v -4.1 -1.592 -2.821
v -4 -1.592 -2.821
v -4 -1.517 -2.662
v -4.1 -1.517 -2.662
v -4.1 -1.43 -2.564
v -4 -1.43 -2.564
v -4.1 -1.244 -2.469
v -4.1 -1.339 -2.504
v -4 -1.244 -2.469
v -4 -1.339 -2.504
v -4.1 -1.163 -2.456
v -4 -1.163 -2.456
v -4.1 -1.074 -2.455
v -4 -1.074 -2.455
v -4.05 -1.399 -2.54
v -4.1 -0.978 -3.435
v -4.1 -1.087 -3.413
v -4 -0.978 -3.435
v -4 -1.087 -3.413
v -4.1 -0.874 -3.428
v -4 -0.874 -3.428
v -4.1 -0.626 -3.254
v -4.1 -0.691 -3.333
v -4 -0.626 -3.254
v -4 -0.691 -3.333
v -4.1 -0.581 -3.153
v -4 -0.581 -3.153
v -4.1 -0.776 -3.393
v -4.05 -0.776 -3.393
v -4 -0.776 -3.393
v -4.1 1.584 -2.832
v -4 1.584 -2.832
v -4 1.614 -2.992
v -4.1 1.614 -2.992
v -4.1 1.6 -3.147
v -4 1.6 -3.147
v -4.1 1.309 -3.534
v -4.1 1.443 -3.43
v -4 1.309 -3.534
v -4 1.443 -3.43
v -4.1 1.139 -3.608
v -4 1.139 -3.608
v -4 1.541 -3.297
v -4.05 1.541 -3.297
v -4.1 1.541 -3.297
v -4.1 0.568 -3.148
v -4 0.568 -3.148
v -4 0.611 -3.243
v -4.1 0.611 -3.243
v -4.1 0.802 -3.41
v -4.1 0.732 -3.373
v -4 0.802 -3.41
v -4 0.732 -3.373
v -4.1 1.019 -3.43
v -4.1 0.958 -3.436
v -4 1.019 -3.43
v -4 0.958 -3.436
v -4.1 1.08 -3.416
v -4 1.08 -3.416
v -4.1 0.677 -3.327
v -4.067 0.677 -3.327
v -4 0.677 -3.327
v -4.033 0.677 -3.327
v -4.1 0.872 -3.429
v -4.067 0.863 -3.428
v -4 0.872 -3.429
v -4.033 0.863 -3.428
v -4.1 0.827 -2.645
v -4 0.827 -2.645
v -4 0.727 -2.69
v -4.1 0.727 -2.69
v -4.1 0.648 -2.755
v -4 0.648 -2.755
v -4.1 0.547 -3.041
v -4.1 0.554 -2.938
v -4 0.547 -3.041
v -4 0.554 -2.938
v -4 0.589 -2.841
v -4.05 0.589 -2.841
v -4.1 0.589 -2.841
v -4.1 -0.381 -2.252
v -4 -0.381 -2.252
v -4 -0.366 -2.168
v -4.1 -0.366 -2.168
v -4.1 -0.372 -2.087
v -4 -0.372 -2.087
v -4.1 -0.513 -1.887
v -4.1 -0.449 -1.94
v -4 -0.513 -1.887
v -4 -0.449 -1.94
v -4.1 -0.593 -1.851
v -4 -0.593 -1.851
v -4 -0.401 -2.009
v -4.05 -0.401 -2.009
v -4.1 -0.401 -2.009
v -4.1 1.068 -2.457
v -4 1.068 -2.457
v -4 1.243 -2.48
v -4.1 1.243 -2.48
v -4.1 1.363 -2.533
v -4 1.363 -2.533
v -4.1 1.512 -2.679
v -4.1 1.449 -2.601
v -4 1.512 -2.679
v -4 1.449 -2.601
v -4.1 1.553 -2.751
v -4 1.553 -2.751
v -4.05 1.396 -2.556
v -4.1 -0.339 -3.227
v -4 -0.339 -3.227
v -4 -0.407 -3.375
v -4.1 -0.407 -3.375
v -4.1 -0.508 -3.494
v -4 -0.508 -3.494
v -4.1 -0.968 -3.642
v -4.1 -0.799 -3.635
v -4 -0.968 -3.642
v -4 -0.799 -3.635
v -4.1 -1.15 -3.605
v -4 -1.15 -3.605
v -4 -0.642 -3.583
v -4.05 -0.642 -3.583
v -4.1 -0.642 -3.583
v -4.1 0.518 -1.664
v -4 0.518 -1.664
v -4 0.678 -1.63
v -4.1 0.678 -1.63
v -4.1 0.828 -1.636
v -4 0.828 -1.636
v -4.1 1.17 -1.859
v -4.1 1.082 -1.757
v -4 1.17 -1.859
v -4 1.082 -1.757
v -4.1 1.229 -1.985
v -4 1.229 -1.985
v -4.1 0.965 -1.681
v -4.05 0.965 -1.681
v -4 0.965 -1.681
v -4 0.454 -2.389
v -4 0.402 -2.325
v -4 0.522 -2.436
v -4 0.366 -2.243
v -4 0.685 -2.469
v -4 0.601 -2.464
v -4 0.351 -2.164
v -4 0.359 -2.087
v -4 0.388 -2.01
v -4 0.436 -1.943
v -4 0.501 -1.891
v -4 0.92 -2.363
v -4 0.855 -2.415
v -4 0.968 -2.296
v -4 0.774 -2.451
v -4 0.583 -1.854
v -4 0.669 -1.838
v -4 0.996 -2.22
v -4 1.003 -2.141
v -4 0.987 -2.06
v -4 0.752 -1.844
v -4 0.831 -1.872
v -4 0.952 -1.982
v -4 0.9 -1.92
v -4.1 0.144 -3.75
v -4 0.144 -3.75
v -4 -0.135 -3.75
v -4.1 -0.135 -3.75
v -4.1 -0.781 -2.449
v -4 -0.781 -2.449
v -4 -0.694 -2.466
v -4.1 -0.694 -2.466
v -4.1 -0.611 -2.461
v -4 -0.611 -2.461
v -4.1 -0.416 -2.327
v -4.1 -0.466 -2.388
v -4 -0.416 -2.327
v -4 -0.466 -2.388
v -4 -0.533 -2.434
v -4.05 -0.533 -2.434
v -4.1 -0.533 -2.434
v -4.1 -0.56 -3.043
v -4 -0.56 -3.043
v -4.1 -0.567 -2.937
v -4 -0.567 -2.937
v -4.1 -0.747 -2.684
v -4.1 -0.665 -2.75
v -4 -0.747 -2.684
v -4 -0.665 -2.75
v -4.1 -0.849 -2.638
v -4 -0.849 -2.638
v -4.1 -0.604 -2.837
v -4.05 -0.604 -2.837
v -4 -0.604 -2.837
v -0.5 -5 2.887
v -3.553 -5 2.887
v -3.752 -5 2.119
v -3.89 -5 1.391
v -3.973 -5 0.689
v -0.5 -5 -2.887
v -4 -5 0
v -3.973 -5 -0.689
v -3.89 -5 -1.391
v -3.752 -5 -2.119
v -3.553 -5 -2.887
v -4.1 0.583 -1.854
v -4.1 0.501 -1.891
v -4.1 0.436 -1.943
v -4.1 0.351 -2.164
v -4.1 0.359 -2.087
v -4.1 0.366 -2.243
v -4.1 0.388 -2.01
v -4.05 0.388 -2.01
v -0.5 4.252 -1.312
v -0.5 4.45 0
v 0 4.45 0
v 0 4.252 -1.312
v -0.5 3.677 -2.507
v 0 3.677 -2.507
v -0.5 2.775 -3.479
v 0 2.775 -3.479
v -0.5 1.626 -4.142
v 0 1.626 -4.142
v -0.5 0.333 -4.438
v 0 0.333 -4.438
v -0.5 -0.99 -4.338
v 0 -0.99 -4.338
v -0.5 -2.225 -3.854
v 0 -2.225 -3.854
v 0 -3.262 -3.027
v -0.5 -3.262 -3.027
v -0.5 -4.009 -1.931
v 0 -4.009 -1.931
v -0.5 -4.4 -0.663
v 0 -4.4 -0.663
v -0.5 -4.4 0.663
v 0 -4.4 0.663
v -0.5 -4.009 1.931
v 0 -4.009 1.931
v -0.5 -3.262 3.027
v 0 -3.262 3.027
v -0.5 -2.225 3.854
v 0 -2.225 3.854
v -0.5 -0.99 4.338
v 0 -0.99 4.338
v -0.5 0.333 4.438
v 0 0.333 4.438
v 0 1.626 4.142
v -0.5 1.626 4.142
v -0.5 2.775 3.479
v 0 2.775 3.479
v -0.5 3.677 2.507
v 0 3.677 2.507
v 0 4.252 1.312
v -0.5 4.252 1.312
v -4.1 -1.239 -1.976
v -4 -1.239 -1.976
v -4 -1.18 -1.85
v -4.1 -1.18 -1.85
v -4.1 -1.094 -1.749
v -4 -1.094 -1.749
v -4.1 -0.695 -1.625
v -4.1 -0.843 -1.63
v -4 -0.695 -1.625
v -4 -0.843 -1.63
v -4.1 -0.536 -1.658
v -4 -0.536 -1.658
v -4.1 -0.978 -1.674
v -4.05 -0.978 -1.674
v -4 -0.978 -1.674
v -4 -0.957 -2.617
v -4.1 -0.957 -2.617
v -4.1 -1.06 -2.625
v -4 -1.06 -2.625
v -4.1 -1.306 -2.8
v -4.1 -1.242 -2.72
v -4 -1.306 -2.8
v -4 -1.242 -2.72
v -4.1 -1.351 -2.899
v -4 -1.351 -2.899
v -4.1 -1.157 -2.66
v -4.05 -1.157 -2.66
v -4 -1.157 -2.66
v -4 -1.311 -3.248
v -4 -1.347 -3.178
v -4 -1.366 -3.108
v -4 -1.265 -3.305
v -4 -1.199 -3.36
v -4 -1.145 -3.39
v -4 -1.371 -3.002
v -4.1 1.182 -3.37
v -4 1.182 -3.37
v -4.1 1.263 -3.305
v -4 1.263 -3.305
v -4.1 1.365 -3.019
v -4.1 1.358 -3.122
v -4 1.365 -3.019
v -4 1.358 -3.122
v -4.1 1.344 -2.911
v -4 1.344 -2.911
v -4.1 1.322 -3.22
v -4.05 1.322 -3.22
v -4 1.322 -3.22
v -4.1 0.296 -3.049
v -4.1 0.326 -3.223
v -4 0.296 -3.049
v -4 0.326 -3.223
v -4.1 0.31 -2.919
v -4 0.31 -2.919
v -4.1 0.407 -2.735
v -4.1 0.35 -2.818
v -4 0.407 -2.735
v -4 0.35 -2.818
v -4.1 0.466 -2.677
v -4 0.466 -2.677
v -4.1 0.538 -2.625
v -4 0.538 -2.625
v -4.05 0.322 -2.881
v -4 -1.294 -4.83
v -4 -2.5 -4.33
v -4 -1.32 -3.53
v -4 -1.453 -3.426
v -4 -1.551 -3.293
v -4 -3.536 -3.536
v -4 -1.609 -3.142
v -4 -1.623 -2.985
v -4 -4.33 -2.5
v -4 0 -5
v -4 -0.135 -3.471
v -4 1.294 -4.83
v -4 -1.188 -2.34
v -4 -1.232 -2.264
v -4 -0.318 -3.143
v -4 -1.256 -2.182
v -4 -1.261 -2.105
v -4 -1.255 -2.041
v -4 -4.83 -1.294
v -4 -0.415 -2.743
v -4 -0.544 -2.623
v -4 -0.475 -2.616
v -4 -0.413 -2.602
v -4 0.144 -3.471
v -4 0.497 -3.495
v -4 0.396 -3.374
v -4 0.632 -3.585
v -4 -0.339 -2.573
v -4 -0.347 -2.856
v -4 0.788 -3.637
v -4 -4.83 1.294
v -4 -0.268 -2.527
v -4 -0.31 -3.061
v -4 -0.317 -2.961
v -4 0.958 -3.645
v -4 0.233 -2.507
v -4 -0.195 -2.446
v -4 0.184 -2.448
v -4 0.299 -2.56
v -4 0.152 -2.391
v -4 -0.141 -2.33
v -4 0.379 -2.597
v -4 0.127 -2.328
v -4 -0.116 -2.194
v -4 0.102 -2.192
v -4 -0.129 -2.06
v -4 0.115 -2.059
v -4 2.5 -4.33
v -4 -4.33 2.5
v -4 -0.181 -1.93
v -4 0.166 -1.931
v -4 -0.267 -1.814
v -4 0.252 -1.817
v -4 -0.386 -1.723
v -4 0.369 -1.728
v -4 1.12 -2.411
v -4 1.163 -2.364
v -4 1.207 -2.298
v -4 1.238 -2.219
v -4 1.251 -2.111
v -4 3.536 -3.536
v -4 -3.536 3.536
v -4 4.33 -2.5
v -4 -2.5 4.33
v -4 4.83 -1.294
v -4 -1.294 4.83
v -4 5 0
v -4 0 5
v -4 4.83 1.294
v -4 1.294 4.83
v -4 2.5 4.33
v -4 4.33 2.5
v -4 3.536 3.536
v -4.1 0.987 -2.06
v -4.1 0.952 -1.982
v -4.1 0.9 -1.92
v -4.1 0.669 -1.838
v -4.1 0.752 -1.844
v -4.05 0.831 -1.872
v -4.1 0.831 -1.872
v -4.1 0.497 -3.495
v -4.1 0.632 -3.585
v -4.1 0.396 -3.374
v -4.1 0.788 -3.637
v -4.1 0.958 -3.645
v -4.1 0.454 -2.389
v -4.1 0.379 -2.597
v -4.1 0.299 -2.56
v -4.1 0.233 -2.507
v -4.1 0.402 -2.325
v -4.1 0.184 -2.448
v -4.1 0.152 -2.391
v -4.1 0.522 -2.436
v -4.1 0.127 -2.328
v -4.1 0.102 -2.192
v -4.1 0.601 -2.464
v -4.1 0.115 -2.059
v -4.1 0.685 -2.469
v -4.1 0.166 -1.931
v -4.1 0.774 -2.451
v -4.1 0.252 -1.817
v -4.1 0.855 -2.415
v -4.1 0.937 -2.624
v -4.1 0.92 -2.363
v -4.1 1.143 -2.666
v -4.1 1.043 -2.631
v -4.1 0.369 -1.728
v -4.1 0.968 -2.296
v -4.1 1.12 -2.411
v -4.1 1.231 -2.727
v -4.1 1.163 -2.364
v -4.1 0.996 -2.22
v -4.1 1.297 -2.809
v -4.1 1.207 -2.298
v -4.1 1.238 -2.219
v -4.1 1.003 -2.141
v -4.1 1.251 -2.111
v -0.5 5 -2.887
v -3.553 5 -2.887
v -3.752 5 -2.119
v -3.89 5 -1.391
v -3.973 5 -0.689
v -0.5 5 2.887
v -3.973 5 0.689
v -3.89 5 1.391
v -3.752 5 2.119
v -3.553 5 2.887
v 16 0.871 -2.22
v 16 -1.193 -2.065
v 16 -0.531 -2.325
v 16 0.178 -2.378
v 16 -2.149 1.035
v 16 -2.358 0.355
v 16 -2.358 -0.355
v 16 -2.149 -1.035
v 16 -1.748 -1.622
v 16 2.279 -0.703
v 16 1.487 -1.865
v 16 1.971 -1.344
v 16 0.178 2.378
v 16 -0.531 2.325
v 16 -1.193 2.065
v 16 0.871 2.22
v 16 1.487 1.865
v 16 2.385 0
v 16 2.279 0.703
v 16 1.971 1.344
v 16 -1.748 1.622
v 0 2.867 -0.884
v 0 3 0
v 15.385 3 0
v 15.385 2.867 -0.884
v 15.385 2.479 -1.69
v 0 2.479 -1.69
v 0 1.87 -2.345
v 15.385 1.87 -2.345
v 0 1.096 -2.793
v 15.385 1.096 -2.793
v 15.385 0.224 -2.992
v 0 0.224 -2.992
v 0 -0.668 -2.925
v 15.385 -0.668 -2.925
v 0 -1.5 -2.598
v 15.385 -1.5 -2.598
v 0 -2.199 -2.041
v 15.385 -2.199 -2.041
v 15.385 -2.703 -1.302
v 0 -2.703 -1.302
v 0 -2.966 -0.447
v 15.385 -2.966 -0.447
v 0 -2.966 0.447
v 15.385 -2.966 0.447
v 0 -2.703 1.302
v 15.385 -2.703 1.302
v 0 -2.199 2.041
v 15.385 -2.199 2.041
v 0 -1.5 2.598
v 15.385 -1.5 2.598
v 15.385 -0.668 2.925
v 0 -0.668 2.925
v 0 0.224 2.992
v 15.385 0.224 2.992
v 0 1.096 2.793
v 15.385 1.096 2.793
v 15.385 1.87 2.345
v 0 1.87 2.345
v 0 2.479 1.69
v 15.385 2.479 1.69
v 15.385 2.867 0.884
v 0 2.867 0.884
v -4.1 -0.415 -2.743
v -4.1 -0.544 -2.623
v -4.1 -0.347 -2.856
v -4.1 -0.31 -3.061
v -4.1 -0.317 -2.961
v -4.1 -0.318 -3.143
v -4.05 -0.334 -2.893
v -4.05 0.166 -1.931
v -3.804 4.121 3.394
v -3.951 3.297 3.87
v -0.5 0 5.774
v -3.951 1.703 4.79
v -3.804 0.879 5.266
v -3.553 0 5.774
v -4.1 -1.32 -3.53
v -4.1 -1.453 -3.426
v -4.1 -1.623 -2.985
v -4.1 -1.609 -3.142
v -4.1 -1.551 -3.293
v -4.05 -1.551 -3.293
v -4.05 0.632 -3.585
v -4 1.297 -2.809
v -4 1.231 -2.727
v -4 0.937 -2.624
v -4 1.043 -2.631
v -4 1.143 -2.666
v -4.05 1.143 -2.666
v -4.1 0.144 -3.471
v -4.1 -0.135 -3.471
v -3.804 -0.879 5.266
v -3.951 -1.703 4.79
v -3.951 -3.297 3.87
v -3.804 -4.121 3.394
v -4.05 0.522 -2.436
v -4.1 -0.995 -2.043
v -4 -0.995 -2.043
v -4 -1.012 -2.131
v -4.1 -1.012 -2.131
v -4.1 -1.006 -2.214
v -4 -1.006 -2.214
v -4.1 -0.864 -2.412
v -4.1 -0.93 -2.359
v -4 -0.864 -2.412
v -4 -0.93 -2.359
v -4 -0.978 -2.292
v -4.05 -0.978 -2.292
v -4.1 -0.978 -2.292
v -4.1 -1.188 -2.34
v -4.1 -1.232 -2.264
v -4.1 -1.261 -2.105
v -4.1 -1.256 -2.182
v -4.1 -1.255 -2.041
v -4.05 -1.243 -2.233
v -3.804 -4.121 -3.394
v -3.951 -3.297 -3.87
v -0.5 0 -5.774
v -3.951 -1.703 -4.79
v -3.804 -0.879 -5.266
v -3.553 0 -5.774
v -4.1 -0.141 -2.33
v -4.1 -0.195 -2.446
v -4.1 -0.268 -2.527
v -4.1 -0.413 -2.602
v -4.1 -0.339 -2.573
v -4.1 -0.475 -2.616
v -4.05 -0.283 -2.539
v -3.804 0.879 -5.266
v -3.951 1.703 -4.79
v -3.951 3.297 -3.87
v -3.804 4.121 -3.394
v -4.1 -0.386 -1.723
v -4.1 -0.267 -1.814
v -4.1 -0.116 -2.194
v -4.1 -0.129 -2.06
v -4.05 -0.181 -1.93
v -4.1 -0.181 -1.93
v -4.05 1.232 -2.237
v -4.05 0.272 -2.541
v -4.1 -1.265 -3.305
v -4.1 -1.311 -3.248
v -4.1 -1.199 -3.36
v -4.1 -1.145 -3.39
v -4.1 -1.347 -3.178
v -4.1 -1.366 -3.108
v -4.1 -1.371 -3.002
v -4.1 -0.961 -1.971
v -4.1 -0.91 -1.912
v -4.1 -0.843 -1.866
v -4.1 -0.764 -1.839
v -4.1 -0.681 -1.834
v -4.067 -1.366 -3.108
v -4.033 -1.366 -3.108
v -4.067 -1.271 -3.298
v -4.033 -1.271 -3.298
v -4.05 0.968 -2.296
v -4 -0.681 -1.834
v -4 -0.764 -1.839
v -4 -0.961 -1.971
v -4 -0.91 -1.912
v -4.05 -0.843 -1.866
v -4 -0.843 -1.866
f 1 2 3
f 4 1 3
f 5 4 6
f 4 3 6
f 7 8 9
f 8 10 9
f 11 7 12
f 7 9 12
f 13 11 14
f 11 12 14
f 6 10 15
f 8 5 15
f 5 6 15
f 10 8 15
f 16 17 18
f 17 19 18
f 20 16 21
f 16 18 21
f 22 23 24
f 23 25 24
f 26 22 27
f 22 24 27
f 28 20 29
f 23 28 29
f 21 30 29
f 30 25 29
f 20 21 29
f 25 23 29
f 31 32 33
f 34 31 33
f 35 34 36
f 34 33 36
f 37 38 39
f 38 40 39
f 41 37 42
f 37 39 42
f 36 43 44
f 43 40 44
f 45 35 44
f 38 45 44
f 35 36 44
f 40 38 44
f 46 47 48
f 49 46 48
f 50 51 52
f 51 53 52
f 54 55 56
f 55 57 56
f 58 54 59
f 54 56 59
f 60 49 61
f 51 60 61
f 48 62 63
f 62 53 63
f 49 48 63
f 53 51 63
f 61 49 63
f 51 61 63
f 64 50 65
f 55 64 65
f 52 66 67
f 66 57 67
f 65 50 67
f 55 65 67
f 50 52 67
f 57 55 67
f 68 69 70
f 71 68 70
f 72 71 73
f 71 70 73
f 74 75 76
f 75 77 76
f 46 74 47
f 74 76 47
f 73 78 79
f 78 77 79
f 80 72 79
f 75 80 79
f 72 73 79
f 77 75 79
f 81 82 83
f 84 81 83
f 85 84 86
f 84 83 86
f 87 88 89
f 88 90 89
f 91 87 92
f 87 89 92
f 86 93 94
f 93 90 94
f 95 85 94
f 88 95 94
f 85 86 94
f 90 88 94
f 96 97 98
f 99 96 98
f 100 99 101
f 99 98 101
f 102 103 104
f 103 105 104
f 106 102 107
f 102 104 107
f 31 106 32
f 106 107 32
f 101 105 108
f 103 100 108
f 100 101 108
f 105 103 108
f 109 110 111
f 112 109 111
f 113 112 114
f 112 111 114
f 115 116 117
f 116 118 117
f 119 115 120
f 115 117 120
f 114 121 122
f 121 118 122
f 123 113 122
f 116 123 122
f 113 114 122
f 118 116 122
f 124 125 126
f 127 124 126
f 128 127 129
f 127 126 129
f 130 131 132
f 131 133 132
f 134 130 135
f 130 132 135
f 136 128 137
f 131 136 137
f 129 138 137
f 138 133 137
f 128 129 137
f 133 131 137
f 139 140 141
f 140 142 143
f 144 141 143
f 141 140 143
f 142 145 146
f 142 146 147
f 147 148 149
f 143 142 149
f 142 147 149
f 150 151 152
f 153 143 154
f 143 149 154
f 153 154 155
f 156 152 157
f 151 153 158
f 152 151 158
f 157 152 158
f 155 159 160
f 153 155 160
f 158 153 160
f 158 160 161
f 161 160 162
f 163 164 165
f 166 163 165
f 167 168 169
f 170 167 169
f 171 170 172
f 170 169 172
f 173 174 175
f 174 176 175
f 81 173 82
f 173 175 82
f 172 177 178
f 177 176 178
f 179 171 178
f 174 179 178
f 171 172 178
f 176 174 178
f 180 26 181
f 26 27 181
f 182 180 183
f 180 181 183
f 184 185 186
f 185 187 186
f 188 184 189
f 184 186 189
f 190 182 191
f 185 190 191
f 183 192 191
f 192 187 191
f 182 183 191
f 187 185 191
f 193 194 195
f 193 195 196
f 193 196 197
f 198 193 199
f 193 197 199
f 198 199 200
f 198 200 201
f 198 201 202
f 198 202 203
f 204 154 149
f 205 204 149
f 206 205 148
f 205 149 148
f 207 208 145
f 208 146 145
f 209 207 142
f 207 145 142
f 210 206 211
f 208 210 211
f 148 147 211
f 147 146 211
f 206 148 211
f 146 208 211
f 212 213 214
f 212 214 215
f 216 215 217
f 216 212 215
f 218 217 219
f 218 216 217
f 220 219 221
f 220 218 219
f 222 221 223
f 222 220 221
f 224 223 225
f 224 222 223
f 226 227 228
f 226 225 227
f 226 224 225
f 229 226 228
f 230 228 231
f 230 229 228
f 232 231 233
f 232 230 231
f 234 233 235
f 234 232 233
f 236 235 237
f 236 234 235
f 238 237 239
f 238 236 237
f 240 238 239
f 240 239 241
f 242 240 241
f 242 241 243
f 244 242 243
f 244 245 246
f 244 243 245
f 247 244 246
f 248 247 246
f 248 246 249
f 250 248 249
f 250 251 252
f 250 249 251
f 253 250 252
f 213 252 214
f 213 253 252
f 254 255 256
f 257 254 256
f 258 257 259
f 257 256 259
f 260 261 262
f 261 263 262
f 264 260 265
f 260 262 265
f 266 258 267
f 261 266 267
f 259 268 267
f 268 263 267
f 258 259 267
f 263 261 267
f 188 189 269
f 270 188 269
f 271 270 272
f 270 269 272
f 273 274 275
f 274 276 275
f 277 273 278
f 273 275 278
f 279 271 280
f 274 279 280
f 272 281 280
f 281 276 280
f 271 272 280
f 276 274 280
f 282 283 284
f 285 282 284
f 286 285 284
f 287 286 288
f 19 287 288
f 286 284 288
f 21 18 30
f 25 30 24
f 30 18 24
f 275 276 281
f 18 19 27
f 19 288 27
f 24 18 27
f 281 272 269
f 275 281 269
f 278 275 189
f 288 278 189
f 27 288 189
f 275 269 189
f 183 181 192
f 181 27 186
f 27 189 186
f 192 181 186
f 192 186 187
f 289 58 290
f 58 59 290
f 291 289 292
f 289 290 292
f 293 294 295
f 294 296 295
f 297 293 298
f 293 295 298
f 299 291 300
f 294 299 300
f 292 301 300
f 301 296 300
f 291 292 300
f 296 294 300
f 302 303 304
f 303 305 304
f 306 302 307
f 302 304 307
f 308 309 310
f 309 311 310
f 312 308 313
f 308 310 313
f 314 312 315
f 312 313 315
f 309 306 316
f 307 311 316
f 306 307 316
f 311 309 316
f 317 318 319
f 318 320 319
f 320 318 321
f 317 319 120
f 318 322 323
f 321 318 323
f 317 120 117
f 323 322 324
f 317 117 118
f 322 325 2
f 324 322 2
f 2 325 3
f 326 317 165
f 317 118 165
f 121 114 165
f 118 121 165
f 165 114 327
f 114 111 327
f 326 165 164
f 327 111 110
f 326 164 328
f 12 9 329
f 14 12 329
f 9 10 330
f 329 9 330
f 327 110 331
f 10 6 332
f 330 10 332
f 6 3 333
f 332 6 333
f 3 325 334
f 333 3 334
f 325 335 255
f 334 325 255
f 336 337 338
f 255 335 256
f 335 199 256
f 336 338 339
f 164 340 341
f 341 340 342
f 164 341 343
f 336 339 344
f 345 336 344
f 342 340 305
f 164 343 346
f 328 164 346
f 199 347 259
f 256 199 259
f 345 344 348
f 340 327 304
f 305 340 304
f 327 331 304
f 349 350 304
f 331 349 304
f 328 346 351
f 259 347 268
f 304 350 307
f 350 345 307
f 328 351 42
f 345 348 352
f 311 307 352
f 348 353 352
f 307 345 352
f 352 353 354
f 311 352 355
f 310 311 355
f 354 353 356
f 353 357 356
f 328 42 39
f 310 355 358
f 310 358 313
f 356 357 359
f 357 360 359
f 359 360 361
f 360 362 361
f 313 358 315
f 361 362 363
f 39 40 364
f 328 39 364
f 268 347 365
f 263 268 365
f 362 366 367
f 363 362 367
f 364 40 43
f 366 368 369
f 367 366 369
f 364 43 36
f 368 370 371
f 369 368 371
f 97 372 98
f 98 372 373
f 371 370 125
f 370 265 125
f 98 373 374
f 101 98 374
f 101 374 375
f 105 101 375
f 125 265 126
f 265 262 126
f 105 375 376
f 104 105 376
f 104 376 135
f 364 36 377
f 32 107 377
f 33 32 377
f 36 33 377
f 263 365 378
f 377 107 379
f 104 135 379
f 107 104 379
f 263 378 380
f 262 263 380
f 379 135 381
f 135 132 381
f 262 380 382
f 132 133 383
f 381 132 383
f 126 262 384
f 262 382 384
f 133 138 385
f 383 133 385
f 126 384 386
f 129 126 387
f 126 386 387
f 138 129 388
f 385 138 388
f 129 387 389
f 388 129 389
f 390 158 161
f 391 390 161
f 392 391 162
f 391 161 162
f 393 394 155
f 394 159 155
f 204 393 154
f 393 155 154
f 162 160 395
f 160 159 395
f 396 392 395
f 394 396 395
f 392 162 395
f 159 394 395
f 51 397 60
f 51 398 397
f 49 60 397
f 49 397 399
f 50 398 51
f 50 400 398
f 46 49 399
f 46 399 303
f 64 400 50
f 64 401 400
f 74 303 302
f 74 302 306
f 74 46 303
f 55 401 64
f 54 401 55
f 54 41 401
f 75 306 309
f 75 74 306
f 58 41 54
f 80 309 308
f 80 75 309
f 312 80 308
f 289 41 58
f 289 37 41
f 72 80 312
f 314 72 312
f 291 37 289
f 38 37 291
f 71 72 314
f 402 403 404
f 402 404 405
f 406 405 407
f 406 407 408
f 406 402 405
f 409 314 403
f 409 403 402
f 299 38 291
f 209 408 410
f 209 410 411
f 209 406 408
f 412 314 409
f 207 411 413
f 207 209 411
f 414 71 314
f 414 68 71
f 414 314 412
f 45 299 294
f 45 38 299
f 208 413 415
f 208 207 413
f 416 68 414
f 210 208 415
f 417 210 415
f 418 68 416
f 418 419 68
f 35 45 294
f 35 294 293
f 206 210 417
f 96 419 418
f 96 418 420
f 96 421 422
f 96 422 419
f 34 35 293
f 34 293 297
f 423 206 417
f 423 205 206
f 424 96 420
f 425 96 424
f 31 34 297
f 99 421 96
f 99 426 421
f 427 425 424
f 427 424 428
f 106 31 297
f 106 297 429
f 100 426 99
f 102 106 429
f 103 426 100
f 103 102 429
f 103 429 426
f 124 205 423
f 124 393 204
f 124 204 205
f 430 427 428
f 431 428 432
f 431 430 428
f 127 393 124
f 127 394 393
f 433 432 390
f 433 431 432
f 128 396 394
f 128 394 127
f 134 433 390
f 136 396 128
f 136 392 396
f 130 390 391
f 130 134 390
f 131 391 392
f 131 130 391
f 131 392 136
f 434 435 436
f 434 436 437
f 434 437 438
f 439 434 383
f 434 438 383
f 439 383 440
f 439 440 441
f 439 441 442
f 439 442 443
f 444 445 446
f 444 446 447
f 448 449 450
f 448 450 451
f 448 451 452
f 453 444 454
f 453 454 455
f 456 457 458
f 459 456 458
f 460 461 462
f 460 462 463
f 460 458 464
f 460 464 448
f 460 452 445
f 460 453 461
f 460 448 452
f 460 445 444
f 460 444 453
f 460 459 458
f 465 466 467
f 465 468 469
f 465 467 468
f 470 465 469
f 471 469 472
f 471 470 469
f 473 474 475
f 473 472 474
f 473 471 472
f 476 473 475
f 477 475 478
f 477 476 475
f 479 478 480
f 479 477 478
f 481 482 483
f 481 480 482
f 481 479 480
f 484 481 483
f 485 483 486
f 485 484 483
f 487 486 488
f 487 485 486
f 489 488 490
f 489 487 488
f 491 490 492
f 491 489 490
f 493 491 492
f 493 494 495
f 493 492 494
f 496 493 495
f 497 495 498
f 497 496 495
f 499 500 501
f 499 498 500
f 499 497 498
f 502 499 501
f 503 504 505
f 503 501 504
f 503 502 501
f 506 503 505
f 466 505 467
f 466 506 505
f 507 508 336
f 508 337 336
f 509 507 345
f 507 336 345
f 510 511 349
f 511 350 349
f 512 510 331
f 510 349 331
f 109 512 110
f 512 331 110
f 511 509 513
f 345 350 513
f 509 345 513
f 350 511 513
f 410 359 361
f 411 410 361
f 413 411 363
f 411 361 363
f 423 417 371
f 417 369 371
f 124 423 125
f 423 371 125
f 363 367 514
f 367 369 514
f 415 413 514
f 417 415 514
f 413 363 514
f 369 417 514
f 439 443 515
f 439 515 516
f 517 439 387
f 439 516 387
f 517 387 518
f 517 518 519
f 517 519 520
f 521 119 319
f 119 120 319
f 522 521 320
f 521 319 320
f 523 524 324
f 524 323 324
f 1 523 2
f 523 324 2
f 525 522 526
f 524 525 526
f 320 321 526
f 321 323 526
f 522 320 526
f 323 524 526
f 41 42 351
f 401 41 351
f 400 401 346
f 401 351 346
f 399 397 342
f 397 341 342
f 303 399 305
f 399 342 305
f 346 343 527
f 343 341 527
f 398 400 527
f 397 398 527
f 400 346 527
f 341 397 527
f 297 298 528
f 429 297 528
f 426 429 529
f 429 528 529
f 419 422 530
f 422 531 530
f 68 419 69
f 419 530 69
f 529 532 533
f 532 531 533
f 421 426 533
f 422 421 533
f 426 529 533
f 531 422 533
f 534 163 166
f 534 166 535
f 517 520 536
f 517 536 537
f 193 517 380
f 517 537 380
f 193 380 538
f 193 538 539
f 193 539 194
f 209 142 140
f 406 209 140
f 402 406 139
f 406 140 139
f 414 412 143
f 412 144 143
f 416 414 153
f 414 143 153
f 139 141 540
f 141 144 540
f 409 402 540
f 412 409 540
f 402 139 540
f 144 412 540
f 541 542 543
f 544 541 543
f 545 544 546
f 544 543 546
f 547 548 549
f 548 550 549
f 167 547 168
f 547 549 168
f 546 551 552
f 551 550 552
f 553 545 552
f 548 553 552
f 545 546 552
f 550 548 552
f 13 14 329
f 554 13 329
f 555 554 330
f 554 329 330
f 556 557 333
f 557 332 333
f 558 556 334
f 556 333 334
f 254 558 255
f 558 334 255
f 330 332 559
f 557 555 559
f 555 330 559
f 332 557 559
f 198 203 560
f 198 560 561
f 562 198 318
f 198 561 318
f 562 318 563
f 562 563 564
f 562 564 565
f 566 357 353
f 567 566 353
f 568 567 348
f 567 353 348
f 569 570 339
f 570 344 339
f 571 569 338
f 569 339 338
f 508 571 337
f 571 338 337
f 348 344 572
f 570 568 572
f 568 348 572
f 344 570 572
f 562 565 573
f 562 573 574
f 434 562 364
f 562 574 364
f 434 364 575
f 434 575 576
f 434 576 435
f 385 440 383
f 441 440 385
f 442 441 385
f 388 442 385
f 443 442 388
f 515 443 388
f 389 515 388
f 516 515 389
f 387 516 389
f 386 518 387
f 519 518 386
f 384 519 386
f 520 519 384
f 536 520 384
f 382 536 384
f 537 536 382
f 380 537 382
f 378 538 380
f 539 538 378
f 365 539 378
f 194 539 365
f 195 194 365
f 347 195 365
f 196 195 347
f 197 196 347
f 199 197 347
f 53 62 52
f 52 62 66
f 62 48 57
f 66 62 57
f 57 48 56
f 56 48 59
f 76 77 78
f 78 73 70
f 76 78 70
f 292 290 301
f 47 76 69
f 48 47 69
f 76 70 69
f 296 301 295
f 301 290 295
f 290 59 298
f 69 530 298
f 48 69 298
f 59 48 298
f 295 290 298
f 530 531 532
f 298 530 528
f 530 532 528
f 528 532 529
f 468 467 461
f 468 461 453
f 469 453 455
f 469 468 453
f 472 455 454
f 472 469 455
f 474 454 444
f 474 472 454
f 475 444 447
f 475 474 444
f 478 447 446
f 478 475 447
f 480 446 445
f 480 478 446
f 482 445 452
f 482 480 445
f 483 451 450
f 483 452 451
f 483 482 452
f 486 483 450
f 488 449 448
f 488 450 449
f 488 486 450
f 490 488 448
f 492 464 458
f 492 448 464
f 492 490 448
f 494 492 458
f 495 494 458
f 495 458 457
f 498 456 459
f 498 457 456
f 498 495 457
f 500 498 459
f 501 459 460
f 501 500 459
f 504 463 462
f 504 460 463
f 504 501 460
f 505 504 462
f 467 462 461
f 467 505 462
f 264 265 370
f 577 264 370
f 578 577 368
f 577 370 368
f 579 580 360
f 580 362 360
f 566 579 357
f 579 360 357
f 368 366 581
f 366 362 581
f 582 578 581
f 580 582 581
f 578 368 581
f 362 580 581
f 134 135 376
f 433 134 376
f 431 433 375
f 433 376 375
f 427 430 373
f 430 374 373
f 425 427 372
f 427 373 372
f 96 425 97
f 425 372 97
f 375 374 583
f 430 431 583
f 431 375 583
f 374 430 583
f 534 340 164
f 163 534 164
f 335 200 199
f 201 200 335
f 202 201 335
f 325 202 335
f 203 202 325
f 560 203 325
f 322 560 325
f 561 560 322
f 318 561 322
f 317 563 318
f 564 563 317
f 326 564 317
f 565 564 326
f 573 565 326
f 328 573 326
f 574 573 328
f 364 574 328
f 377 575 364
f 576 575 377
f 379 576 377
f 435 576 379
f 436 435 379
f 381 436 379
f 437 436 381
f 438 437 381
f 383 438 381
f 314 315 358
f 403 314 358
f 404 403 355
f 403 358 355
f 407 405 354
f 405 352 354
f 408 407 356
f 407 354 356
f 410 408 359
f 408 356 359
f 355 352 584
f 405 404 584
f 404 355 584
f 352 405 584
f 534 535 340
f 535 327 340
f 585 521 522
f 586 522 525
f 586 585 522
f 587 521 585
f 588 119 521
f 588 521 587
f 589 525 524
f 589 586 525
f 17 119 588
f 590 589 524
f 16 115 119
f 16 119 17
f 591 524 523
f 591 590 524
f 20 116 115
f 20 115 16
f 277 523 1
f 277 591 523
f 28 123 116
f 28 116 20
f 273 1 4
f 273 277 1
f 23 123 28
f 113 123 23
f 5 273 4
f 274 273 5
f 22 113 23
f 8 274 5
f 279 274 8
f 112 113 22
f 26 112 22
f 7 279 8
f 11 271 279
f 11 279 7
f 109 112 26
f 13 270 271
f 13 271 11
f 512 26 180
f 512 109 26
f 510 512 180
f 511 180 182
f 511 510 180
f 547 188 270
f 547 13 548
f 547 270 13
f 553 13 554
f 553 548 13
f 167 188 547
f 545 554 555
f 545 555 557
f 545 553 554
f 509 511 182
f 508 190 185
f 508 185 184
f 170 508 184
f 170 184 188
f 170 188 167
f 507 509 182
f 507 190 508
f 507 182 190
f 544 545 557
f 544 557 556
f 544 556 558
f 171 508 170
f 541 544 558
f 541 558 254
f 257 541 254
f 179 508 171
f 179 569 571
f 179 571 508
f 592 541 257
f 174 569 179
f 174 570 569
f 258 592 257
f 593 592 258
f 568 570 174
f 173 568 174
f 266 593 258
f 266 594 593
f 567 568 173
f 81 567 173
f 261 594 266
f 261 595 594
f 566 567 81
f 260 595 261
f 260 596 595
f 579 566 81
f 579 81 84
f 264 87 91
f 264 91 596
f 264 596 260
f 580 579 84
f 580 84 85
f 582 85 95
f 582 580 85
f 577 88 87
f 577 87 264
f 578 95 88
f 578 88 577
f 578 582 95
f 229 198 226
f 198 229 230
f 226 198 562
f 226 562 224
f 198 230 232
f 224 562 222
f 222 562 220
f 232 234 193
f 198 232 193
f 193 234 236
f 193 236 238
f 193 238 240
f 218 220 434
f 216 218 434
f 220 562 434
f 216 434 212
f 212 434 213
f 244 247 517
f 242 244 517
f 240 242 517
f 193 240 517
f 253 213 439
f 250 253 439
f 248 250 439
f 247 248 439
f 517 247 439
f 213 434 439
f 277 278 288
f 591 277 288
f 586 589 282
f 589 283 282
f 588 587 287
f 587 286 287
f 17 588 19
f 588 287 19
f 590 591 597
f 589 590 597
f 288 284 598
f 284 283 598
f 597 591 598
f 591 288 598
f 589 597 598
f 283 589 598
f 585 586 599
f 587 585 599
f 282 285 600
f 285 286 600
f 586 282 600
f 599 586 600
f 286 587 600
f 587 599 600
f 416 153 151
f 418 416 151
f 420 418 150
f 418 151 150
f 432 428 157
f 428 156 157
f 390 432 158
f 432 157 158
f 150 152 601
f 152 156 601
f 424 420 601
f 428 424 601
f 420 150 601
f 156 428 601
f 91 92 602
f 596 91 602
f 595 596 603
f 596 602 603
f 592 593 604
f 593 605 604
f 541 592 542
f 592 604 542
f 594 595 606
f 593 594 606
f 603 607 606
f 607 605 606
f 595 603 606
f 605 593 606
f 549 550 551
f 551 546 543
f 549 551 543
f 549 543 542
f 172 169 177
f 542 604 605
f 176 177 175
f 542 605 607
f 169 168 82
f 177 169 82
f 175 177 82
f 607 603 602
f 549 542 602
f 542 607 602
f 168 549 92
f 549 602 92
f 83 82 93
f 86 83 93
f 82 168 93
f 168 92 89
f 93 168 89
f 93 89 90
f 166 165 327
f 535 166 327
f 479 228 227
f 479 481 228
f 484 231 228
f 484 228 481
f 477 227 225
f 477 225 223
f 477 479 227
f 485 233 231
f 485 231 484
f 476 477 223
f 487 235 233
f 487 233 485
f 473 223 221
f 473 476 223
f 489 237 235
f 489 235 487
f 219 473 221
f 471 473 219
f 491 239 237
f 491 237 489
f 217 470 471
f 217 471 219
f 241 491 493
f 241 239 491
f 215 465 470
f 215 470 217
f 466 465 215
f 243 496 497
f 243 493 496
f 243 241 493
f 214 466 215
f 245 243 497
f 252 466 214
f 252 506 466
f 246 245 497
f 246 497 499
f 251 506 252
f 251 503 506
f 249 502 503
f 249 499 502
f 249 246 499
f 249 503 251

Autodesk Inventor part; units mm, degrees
ref_plane "YZ Plane" through (0, 0, 0) normal (1, 0, 0) x (0, 1, 0)
ref_plane "XZ Plane" through (0, 0, 0) normal (0, 1, 0) x (-1, 0, 0)
ref_plane "XY Plane" through (0, 0, 0) normal (0, 0, 1) x (1, 0, 0)
sketch "Sketch1" plane through (0, 0, 0) normal (0, 0, 1) x (1, 0, 0)
  line L0 (-8, 0) -> (20, 0) projected
  line L1 (16, 0) -> (16, 2.385)
  line L2 (16, 2.385) -> (15.385, 3)
  line L3 (15.385, 3) -> (0, 3)
  line L4 (0, 3) -> (0, 4.45)
  line L5 (0, 4.45) -> (-0.5, 4.45)
  line L6 (-0.5, 4.45) -> (-0.5, 5)
  line L7 (-0.5, 5) -> (-4, 5)
  line L8 (-4, 5) -> (-4, 0)
  point P0 (0, 0)
  dimension "d0" = 6
  dimension "d1" = 16
  dimension "d2" = 10
  dimension "d3" = 8.9
  dimension "d4" = 4
  dimension "d5" = 45
  dimension "d6" = 4.77
  dimension "d7" = 0.5
revolve "Revolution1" add sketch "Sketch1" angle 360 about axis through (-10, 0, 0) along (1, 0, 0)
sketch "Sketch2" plane through (-4, 0, 0) normal (-1, 0, 0) x (0, 0, 1)
  circle A0 centre (0, 0) radius 5 projected
  line L0 (2.8868, 5) -> (5.7735, 0)
  line L1 (5.7735, 0) -> (2.8868, -5)
  line L2 (2.8868, -5) -> (-2.8868, -5)
  line L3 (-2.8868, -5) -> (-5.7735, 0)
  line L4 (-5.7735, 0) -> (-2.8868, 5)
  line L5 (-2.8868, 5) -> (2.8868, 5)
  point P0 (0, 5)
extrude "Extrusion1" add sketch "Sketch2" against normal up to surface (3.5 mm away)
sketch "Sketch3" plane through (0, 0, 0) normal (0, 0, 1) x (1, 0, 0)
  line L0 (-4, 5.55) -> (-0.5, 5.55)
  line L1 (-0.5, 5.55) -> (-0.5, 6.66)
  line L2 (-0.5, 6.66) -> (-4, 6.66)
  line L3 (-4, 6.66) -> (-4, 5.55)
  line L4 (-4.8, 0) -> (0.8, 0) projected
  line L5 (-4, 5) -> (-3.0416, 6.66)
  line L6 (-4, 5.55) -> (-4, 5)
  point P0 (0, 0)
  point P1 (-0.5, 5)
  dimension "d11" = 11.1
  dimension "d12" = 1.11
  dimension "d13" = 30
revolve "Revolution2" cut sketch "Sketch3" angle 360 about axis through (-10, 0, 0) along (1, 0, 0) contours L3 L2 L5 L0 | L0 L5 L6
thread "Thread1" size "M6x1" class "6g" standard "ISO Metric profile" full length
sketch "Sketch4" plane through (-4, 0, 0) normal (-1, 0, 0) x (0, 0, 1)
  circle A0 centre (0, 0) radius 3.75 construction
  spline S0 degree 2 poles (-2.4547, -1.0741) (-2.3544, -1.2038) (-2.112, -1.282) (-1.9755, -1.2387) knots 0 0 0 1 2 2 2
  spline S1 degree 2 poles (-1.9755, -1.2387) (-1.7677, -1.1728) (-1.5794, -0.7835) (-1.6577, -0.5365) knots 0 0 0 1 2 2 2
  spline S2 degree 2 poles (-1.6577, -0.5365) (-1.7371, -0.2866) (-2.1226, -0.0747) (-2.3304, -0.1406) knots 0 0 0 1 2 2 2
  spline S3 degree 2 poles (-2.3304, -0.1406) (-2.4626, -0.1826) (-2.6145, -0.3843) (-2.623, -0.5438) knots 0 0 0 1 2 2 2
  spline S4 degree 2 poles (-2.623, -0.5438) (-2.736, -0.3845) (-3.0498, -0.2826) (-3.227, -0.3389) knots 0 0 0 1 2 2 2
  spline S5 degree 2 poles (-3.227, -0.3389) (-3.4711, -0.4163) (-3.6941, -0.8677) (-3.6047, -1.1496) knots 0 0 0 1 2 2 2
  spline S6 degree 2 poles (-3.6047, -1.1496) (-3.5152, -1.4315) (-3.0713, -1.6712) (-2.8214, -1.5919) knots 0 0 0 1 2 2 2
  spline S7 degree 2 poles (-2.8214, -1.5919) (-2.6354, -1.5329) (-2.444, -1.2642) (-2.4547, -1.0741) knots 0 0 0 1 2 2 2
  spline S8 degree 2 poles (-2.8994, -1.3512) (-2.9996, -1.383) (-3.217, -1.348) (-3.3792, -1.1948) (-3.4133, -1.0873) knots 0 0 0 1 2 3 3 3
  spline S9 degree 2 poles (-3.4133, -1.0873) (-3.4668, -0.9187) (-3.319, -0.6335) (-3.1534, -0.581) knots 0 0 0 1 2 2 2
  spline S10 degree 2 poles (-3.1534, -0.581) (-2.9834, -0.527) (-2.6915, -0.6807) (-2.638, -0.8492) knots 0 0 0 1 2 2 2
  spline S11 degree 2 poles (-2.638, -0.8492) (-2.5855, -1.0149) (-2.7352, -1.2991) (-2.8994, -1.3512) knots 0 0 0 1 2 2 2
  spline S12 degree 2 poles (-2.0433, -0.9947) (-2.1784, -1.0376) (-2.4047, -0.9191) (-2.4486, -0.7811) knots 0 0 0 1 2 2 2
  spline S13 degree 2 poles (-2.4486, -0.7811) (-2.4914, -0.646) (-2.3759, -0.4206) (-2.2524, -0.3814) knots 0 0 0 1 2 2 2
  spline S14 degree 2 poles (-2.2524, -0.3814) (-2.1245, -0.3408) (-1.8929, -0.4608) (-1.8509, -0.593) knots 0 0 0 1 2 2 2
  spline S15 degree 2 poles (-1.8509, -0.593) (-1.808, -0.7282) (-1.9242, -0.9569) (-2.0433, -0.9947) knots 0 0 0 1 2 2 2
  line L0 (-3.75, -0.1349) -> (-3.471, -0.1349)
  line L1 (-3.471, -0.1349) -> (-3.471, 0.1441)
  line L2 (-3.471, 0.1441) -> (-3.75, 0.1441)
  line L3 (-3.75, 0.1441) -> (-3.75, -0.1349)
  spline S16 degree 2 poles (-2.6249, 0.538) (-2.6177, 0.3742) (-2.4648, 0.1705) (-2.3282, 0.1272) knots 0 0 0 1 2 2 2
  spline S17 degree 2 poles (-2.3282, 0.1272) (-2.1205, 0.0612) (-1.7421, 0.2706) (-1.6637, 0.5176) knots 0 0 0 1 2 2 2
  spline S18 degree 2 poles (-1.6637, 0.5176) (-1.5844, 0.7675) (-1.7772, 1.163) (-1.985, 1.2289) knots 0 0 0 1 2 2 2
  spline S19 degree 2 poles (-1.985, 1.2289) (-2.1172, 1.2709) (-2.3576, 1.1936) (-2.4566, 1.0683) knots 0 0 0 1 2 2 2
  spline S20 degree 2 poles (-2.4566, 1.0683) (-2.457, 1.2636) (-2.6546, 1.5278) (-2.8319, 1.5841) knots 0 0 0 1 2 2 2
  spline S21 degree 2 poles (-2.8319, 1.5841) (-3.076, 1.6615) (-3.5184, 1.4213) (-3.6079, 1.1394) knots 0 0 0 1 2 2 2
  spline S22 degree 2 poles (-3.6079, 1.1394) (-3.6973, 0.8576) (-3.4729, 0.4057) (-3.223, 0.3264) knots 0 0 0 1 2 2 2
  spline S23 degree 2 poles (-3.223, 0.3264) (-3.037, 0.2674) (-2.7257, 0.3765) (-2.6249, 0.538) knots 0 0 0 1 2 2 2
  spline S24 degree 2 poles (-3.1479, 0.568) (-3.2482, 0.5999) (-3.4056, 0.7538) (-3.4498, 0.9725) (-3.4156, 1.08) knots 0 0 0 1 2 3 3 3
  spline S25 degree 2 poles (-3.4156, 1.08) (-3.3621, 1.2486) (-3.0769, 1.3963) (-2.9113, 1.3438) knots 0 0 0 1 2 2 2
  spline S26 degree 2 poles (-2.9113, 1.3438) (-2.7413, 1.2898) (-2.5915, 0.996) (-2.645, 0.8274) knots 0 0 0 1 2 2 2
  spline S27 degree 2 poles (-2.645, 0.8274) (-2.6975, 0.6618) (-2.9837, 0.5159) (-3.1479, 0.568) knots 0 0 0 1 2 2 2
  spline S28 degree 2 poles (-2.243, 0.3656) (-2.3781, 0.4085) (-2.4947, 0.6358) (-2.4509, 0.7738) knots 0 0 0 1 2 2 2
  spline S29 degree 2 poles (-2.4509, 0.7738) (-2.408, 0.909) (-2.1836, 1.0265) (-2.0601, 0.9873) knots 0 0 0 1 2 2 2
  spline S30 degree 2 poles (-2.0601, 0.9873) (-1.9322, 0.9467) (-1.8122, 0.7151) (-1.8542, 0.5829) knots 0 0 0 1 2 2 2
  spline S31 degree 2 poles (-1.8542, 0.5829) (-1.897, 0.4477) (-2.1238, 0.3278) (-2.243, 0.3656) knots 0 0 0 1 2 2 2
  dimension "d17" = 7.5
extrude "Extrusion2" add sketch "Sketch4" along normal blind 0.1
equation "\"d7\" = 0.125 * d4"
equation "\"d12\" = 0.1 * d11"
properties part number "Sechskantschraube ISO 4017-M6x15-8.8" material "Steel"
